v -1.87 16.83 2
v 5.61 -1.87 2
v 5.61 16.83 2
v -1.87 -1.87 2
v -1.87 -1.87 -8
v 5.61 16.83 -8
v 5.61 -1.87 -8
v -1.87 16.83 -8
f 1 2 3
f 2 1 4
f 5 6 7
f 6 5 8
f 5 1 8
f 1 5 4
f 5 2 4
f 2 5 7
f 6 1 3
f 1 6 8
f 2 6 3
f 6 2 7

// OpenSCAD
// 2.54mm pin header sockets

tolerance = 0.6;
$fn = $preview ? 20 : 100;

z_offset = -8; // 8mm spacer for AE systems
socket_width = 2.54 + tolerance * 2;
socket_height = 10;

module pin_socket(row=1, col=1) {
    translate([-socket_width/2, -socket_width/2, z_offset])
    for (x=[0:row-1], y=[0:col-1])
        translate([x * socket_width, y * socket_width, 0]){
            cube([socket_width, socket_width, 10]);
        }
}

#pin_socket(2, 5);
